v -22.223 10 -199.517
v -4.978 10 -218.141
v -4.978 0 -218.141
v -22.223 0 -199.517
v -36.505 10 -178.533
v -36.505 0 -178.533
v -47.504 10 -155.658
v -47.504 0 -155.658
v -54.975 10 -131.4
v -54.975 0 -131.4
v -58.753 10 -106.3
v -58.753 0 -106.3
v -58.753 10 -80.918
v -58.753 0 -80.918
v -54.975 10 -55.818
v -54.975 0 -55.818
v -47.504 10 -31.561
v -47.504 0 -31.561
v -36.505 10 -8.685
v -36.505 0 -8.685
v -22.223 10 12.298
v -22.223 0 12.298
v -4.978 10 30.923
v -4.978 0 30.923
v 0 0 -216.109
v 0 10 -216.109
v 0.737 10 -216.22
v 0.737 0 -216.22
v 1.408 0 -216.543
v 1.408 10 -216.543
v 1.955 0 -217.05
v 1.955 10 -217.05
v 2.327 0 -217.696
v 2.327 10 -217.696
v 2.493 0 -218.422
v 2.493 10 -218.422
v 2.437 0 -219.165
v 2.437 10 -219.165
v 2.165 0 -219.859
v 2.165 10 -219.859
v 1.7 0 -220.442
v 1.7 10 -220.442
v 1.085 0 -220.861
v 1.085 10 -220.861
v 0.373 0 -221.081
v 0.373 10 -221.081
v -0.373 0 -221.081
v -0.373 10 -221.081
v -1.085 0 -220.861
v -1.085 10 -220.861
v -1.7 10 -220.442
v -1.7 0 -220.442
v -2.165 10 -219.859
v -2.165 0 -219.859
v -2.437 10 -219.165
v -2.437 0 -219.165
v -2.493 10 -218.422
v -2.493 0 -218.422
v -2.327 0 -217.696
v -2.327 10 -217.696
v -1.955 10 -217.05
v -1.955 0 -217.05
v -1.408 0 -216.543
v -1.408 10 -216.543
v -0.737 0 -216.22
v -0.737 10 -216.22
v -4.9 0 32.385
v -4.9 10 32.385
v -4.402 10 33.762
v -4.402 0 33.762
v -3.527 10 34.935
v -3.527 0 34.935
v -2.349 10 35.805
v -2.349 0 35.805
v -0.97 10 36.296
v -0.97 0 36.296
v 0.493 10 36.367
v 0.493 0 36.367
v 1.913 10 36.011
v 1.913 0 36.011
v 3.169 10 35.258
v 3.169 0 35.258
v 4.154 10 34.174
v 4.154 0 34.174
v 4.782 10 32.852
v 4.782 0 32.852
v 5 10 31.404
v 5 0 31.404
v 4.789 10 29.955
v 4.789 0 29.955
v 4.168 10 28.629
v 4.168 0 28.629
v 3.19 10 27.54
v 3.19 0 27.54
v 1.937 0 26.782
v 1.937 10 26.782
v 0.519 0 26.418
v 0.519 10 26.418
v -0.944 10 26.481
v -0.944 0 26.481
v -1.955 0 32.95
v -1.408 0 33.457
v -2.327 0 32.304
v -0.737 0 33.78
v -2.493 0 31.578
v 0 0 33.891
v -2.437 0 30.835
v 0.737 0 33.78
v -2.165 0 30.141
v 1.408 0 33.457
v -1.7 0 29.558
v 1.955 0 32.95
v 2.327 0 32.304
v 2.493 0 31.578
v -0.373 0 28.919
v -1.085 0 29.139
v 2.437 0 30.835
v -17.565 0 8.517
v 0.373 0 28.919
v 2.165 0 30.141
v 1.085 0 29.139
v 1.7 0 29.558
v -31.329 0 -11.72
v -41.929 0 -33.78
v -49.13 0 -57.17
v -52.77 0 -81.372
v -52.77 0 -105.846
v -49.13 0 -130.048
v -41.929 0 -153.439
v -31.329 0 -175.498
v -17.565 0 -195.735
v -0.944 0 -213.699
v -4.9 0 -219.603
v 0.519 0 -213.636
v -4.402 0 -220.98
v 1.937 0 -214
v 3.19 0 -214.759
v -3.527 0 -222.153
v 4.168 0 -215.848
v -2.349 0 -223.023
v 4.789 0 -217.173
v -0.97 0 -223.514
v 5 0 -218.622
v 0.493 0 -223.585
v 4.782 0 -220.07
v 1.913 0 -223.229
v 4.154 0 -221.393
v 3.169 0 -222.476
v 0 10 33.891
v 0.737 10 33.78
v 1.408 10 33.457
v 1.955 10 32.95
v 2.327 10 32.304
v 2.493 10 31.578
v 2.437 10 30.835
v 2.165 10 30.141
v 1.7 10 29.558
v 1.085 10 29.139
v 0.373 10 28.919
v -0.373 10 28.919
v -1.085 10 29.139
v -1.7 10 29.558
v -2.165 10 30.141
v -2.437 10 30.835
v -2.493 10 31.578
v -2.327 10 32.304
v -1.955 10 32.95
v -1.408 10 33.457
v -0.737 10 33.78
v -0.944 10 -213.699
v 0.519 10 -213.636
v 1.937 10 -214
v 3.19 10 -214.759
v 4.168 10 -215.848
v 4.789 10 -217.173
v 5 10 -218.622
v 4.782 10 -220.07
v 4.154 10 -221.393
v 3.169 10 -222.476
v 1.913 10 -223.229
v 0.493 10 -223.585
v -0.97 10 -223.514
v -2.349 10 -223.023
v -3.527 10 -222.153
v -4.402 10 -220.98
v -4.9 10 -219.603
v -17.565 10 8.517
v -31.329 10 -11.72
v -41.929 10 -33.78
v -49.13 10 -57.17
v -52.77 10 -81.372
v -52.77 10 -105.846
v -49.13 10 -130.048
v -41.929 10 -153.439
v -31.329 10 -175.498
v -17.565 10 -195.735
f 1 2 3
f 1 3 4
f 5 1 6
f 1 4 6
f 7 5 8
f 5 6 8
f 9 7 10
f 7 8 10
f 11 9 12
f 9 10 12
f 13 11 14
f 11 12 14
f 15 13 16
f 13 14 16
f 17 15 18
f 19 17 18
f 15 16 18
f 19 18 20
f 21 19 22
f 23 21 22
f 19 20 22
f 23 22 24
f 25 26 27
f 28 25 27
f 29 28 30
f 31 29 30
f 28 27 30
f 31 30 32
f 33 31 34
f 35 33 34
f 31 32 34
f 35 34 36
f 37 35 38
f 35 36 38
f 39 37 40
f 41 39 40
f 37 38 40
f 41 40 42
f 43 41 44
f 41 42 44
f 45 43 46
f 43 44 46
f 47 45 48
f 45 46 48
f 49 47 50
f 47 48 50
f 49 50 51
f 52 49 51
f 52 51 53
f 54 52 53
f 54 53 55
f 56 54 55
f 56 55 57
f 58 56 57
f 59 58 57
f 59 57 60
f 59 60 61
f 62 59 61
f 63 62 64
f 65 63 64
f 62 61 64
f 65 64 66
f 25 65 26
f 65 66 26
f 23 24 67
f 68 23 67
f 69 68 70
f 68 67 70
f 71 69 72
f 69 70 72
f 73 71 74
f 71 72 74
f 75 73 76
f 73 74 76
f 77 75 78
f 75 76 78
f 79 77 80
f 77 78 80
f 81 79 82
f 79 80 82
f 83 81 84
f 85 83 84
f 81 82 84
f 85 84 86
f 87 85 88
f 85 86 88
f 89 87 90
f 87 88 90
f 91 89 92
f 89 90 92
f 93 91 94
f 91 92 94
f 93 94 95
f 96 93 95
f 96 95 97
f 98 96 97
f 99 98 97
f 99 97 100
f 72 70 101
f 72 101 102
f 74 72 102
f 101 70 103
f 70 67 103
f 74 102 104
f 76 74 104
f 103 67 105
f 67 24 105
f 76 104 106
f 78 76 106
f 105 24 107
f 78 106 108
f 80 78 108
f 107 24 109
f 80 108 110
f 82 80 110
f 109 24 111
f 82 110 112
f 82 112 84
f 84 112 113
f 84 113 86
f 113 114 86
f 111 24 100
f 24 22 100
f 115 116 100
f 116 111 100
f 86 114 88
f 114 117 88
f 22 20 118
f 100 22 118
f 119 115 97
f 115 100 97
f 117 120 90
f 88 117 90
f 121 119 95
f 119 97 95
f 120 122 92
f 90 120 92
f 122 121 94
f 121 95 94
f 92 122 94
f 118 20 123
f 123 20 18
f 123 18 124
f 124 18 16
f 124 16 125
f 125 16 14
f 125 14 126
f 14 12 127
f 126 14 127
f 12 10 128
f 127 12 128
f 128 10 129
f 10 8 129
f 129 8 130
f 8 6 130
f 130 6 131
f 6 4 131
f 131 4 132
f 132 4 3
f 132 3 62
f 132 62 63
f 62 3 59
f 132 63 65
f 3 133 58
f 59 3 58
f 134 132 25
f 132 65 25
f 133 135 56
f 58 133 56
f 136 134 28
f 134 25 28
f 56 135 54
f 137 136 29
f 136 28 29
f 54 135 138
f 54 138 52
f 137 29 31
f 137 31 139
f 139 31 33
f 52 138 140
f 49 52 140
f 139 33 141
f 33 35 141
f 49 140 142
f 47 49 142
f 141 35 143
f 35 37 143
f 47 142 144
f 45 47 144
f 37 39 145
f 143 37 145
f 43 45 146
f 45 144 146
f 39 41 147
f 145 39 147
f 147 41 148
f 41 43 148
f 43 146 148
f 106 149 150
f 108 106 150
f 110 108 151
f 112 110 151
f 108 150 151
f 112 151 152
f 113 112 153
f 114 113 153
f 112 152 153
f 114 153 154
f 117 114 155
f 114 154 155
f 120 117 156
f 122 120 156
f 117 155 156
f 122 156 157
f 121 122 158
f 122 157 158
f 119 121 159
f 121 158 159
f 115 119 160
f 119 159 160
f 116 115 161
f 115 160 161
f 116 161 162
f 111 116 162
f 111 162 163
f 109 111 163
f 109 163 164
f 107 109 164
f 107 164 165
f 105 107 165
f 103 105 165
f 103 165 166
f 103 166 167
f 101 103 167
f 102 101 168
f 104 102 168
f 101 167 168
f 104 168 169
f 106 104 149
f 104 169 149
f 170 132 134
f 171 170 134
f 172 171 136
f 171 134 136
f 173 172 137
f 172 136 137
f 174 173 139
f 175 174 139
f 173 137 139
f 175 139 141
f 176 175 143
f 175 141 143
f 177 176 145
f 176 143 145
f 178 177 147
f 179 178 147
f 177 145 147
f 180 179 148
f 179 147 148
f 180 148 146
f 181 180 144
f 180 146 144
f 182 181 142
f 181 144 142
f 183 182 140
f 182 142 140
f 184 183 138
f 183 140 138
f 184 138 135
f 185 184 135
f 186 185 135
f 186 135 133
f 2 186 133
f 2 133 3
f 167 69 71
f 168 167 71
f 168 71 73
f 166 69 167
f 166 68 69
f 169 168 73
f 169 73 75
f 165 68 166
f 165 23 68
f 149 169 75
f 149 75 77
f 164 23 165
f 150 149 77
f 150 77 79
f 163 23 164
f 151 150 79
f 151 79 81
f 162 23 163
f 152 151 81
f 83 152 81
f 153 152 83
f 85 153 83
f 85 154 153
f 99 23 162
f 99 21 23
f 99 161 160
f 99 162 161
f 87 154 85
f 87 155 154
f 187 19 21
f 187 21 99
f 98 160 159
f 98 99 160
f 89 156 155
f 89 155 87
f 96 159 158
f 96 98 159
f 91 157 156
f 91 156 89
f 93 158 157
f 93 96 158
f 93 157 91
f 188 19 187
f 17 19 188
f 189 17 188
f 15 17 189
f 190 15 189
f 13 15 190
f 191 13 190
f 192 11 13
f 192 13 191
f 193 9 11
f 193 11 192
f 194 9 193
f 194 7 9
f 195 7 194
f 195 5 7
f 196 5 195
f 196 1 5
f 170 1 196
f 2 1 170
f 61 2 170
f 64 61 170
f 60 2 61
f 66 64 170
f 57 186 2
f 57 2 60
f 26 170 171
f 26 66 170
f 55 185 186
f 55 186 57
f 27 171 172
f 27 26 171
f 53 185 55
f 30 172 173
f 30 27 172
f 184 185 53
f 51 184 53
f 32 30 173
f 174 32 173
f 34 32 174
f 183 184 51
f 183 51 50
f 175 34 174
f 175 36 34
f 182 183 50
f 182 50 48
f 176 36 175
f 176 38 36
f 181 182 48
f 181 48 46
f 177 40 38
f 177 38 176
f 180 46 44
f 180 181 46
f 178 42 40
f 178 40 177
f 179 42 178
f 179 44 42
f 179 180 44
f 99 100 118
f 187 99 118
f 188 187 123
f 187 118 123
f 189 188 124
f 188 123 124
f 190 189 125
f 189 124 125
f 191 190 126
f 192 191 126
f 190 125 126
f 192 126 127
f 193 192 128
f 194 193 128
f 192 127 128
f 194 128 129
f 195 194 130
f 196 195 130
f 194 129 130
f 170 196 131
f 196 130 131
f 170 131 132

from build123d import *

# Parameters (mm, degrees)
BOSS_EXTRU_1_DEPTH      = 10
ESQUISSE2_R             = 2.5
ENL_V_MAT_EXTRU_1_DEPTH = 10


with BuildPart() as part:
    # Esquisse1 → Boss.-Extru.1 (new body)
    with BuildSketch(Plane(origin=(0, 0, 0), x_dir=(1, 0, 0), z_dir=(0, 1, 0))):
        with BuildLine():
            ThreePointArc((-0.943707896, 213.69893991), (3.70122741, 221.970757316), (-4.978017186, 218.140731151))
            ThreePointArc((-4.978017186, 218.140731151), (-59.227468872, 93.60907386), (-4.978017186, -30.92258343))
            ThreePointArc((-4.978017186, -30.92258343), (3.70122741, -34.752609595), (-0.943707895, -26.48079219))
            ThreePointArc((-0.943707895, -26.48079219), (-53.227468872, 93.60907386), (-0.943707896, 213.69893991))
        make_face()
    extrude(amount=BOSS_EXTRU_1_DEPTH)

    # Esquisse2 → Enlèv. mat.-Extru.1 (cut)
    with BuildSketch(Plane(origin=(0, 10, 0), x_dir=(1, 0, 0), z_dir=(0, 1, 0))):
        with Locations(Location((0, 218.60907386, 0), (0, 0, 270))):
            Circle(ESQUISSE2_R)
        with Locations(Location((0, -31.39092614, 0), (0, 0, 270))):
            Circle(ESQUISSE2_R)
    extrude(amount=-ENL_V_MAT_EXTRU_1_DEPTH, mode=Mode.SUBTRACT)


solid = part.part
